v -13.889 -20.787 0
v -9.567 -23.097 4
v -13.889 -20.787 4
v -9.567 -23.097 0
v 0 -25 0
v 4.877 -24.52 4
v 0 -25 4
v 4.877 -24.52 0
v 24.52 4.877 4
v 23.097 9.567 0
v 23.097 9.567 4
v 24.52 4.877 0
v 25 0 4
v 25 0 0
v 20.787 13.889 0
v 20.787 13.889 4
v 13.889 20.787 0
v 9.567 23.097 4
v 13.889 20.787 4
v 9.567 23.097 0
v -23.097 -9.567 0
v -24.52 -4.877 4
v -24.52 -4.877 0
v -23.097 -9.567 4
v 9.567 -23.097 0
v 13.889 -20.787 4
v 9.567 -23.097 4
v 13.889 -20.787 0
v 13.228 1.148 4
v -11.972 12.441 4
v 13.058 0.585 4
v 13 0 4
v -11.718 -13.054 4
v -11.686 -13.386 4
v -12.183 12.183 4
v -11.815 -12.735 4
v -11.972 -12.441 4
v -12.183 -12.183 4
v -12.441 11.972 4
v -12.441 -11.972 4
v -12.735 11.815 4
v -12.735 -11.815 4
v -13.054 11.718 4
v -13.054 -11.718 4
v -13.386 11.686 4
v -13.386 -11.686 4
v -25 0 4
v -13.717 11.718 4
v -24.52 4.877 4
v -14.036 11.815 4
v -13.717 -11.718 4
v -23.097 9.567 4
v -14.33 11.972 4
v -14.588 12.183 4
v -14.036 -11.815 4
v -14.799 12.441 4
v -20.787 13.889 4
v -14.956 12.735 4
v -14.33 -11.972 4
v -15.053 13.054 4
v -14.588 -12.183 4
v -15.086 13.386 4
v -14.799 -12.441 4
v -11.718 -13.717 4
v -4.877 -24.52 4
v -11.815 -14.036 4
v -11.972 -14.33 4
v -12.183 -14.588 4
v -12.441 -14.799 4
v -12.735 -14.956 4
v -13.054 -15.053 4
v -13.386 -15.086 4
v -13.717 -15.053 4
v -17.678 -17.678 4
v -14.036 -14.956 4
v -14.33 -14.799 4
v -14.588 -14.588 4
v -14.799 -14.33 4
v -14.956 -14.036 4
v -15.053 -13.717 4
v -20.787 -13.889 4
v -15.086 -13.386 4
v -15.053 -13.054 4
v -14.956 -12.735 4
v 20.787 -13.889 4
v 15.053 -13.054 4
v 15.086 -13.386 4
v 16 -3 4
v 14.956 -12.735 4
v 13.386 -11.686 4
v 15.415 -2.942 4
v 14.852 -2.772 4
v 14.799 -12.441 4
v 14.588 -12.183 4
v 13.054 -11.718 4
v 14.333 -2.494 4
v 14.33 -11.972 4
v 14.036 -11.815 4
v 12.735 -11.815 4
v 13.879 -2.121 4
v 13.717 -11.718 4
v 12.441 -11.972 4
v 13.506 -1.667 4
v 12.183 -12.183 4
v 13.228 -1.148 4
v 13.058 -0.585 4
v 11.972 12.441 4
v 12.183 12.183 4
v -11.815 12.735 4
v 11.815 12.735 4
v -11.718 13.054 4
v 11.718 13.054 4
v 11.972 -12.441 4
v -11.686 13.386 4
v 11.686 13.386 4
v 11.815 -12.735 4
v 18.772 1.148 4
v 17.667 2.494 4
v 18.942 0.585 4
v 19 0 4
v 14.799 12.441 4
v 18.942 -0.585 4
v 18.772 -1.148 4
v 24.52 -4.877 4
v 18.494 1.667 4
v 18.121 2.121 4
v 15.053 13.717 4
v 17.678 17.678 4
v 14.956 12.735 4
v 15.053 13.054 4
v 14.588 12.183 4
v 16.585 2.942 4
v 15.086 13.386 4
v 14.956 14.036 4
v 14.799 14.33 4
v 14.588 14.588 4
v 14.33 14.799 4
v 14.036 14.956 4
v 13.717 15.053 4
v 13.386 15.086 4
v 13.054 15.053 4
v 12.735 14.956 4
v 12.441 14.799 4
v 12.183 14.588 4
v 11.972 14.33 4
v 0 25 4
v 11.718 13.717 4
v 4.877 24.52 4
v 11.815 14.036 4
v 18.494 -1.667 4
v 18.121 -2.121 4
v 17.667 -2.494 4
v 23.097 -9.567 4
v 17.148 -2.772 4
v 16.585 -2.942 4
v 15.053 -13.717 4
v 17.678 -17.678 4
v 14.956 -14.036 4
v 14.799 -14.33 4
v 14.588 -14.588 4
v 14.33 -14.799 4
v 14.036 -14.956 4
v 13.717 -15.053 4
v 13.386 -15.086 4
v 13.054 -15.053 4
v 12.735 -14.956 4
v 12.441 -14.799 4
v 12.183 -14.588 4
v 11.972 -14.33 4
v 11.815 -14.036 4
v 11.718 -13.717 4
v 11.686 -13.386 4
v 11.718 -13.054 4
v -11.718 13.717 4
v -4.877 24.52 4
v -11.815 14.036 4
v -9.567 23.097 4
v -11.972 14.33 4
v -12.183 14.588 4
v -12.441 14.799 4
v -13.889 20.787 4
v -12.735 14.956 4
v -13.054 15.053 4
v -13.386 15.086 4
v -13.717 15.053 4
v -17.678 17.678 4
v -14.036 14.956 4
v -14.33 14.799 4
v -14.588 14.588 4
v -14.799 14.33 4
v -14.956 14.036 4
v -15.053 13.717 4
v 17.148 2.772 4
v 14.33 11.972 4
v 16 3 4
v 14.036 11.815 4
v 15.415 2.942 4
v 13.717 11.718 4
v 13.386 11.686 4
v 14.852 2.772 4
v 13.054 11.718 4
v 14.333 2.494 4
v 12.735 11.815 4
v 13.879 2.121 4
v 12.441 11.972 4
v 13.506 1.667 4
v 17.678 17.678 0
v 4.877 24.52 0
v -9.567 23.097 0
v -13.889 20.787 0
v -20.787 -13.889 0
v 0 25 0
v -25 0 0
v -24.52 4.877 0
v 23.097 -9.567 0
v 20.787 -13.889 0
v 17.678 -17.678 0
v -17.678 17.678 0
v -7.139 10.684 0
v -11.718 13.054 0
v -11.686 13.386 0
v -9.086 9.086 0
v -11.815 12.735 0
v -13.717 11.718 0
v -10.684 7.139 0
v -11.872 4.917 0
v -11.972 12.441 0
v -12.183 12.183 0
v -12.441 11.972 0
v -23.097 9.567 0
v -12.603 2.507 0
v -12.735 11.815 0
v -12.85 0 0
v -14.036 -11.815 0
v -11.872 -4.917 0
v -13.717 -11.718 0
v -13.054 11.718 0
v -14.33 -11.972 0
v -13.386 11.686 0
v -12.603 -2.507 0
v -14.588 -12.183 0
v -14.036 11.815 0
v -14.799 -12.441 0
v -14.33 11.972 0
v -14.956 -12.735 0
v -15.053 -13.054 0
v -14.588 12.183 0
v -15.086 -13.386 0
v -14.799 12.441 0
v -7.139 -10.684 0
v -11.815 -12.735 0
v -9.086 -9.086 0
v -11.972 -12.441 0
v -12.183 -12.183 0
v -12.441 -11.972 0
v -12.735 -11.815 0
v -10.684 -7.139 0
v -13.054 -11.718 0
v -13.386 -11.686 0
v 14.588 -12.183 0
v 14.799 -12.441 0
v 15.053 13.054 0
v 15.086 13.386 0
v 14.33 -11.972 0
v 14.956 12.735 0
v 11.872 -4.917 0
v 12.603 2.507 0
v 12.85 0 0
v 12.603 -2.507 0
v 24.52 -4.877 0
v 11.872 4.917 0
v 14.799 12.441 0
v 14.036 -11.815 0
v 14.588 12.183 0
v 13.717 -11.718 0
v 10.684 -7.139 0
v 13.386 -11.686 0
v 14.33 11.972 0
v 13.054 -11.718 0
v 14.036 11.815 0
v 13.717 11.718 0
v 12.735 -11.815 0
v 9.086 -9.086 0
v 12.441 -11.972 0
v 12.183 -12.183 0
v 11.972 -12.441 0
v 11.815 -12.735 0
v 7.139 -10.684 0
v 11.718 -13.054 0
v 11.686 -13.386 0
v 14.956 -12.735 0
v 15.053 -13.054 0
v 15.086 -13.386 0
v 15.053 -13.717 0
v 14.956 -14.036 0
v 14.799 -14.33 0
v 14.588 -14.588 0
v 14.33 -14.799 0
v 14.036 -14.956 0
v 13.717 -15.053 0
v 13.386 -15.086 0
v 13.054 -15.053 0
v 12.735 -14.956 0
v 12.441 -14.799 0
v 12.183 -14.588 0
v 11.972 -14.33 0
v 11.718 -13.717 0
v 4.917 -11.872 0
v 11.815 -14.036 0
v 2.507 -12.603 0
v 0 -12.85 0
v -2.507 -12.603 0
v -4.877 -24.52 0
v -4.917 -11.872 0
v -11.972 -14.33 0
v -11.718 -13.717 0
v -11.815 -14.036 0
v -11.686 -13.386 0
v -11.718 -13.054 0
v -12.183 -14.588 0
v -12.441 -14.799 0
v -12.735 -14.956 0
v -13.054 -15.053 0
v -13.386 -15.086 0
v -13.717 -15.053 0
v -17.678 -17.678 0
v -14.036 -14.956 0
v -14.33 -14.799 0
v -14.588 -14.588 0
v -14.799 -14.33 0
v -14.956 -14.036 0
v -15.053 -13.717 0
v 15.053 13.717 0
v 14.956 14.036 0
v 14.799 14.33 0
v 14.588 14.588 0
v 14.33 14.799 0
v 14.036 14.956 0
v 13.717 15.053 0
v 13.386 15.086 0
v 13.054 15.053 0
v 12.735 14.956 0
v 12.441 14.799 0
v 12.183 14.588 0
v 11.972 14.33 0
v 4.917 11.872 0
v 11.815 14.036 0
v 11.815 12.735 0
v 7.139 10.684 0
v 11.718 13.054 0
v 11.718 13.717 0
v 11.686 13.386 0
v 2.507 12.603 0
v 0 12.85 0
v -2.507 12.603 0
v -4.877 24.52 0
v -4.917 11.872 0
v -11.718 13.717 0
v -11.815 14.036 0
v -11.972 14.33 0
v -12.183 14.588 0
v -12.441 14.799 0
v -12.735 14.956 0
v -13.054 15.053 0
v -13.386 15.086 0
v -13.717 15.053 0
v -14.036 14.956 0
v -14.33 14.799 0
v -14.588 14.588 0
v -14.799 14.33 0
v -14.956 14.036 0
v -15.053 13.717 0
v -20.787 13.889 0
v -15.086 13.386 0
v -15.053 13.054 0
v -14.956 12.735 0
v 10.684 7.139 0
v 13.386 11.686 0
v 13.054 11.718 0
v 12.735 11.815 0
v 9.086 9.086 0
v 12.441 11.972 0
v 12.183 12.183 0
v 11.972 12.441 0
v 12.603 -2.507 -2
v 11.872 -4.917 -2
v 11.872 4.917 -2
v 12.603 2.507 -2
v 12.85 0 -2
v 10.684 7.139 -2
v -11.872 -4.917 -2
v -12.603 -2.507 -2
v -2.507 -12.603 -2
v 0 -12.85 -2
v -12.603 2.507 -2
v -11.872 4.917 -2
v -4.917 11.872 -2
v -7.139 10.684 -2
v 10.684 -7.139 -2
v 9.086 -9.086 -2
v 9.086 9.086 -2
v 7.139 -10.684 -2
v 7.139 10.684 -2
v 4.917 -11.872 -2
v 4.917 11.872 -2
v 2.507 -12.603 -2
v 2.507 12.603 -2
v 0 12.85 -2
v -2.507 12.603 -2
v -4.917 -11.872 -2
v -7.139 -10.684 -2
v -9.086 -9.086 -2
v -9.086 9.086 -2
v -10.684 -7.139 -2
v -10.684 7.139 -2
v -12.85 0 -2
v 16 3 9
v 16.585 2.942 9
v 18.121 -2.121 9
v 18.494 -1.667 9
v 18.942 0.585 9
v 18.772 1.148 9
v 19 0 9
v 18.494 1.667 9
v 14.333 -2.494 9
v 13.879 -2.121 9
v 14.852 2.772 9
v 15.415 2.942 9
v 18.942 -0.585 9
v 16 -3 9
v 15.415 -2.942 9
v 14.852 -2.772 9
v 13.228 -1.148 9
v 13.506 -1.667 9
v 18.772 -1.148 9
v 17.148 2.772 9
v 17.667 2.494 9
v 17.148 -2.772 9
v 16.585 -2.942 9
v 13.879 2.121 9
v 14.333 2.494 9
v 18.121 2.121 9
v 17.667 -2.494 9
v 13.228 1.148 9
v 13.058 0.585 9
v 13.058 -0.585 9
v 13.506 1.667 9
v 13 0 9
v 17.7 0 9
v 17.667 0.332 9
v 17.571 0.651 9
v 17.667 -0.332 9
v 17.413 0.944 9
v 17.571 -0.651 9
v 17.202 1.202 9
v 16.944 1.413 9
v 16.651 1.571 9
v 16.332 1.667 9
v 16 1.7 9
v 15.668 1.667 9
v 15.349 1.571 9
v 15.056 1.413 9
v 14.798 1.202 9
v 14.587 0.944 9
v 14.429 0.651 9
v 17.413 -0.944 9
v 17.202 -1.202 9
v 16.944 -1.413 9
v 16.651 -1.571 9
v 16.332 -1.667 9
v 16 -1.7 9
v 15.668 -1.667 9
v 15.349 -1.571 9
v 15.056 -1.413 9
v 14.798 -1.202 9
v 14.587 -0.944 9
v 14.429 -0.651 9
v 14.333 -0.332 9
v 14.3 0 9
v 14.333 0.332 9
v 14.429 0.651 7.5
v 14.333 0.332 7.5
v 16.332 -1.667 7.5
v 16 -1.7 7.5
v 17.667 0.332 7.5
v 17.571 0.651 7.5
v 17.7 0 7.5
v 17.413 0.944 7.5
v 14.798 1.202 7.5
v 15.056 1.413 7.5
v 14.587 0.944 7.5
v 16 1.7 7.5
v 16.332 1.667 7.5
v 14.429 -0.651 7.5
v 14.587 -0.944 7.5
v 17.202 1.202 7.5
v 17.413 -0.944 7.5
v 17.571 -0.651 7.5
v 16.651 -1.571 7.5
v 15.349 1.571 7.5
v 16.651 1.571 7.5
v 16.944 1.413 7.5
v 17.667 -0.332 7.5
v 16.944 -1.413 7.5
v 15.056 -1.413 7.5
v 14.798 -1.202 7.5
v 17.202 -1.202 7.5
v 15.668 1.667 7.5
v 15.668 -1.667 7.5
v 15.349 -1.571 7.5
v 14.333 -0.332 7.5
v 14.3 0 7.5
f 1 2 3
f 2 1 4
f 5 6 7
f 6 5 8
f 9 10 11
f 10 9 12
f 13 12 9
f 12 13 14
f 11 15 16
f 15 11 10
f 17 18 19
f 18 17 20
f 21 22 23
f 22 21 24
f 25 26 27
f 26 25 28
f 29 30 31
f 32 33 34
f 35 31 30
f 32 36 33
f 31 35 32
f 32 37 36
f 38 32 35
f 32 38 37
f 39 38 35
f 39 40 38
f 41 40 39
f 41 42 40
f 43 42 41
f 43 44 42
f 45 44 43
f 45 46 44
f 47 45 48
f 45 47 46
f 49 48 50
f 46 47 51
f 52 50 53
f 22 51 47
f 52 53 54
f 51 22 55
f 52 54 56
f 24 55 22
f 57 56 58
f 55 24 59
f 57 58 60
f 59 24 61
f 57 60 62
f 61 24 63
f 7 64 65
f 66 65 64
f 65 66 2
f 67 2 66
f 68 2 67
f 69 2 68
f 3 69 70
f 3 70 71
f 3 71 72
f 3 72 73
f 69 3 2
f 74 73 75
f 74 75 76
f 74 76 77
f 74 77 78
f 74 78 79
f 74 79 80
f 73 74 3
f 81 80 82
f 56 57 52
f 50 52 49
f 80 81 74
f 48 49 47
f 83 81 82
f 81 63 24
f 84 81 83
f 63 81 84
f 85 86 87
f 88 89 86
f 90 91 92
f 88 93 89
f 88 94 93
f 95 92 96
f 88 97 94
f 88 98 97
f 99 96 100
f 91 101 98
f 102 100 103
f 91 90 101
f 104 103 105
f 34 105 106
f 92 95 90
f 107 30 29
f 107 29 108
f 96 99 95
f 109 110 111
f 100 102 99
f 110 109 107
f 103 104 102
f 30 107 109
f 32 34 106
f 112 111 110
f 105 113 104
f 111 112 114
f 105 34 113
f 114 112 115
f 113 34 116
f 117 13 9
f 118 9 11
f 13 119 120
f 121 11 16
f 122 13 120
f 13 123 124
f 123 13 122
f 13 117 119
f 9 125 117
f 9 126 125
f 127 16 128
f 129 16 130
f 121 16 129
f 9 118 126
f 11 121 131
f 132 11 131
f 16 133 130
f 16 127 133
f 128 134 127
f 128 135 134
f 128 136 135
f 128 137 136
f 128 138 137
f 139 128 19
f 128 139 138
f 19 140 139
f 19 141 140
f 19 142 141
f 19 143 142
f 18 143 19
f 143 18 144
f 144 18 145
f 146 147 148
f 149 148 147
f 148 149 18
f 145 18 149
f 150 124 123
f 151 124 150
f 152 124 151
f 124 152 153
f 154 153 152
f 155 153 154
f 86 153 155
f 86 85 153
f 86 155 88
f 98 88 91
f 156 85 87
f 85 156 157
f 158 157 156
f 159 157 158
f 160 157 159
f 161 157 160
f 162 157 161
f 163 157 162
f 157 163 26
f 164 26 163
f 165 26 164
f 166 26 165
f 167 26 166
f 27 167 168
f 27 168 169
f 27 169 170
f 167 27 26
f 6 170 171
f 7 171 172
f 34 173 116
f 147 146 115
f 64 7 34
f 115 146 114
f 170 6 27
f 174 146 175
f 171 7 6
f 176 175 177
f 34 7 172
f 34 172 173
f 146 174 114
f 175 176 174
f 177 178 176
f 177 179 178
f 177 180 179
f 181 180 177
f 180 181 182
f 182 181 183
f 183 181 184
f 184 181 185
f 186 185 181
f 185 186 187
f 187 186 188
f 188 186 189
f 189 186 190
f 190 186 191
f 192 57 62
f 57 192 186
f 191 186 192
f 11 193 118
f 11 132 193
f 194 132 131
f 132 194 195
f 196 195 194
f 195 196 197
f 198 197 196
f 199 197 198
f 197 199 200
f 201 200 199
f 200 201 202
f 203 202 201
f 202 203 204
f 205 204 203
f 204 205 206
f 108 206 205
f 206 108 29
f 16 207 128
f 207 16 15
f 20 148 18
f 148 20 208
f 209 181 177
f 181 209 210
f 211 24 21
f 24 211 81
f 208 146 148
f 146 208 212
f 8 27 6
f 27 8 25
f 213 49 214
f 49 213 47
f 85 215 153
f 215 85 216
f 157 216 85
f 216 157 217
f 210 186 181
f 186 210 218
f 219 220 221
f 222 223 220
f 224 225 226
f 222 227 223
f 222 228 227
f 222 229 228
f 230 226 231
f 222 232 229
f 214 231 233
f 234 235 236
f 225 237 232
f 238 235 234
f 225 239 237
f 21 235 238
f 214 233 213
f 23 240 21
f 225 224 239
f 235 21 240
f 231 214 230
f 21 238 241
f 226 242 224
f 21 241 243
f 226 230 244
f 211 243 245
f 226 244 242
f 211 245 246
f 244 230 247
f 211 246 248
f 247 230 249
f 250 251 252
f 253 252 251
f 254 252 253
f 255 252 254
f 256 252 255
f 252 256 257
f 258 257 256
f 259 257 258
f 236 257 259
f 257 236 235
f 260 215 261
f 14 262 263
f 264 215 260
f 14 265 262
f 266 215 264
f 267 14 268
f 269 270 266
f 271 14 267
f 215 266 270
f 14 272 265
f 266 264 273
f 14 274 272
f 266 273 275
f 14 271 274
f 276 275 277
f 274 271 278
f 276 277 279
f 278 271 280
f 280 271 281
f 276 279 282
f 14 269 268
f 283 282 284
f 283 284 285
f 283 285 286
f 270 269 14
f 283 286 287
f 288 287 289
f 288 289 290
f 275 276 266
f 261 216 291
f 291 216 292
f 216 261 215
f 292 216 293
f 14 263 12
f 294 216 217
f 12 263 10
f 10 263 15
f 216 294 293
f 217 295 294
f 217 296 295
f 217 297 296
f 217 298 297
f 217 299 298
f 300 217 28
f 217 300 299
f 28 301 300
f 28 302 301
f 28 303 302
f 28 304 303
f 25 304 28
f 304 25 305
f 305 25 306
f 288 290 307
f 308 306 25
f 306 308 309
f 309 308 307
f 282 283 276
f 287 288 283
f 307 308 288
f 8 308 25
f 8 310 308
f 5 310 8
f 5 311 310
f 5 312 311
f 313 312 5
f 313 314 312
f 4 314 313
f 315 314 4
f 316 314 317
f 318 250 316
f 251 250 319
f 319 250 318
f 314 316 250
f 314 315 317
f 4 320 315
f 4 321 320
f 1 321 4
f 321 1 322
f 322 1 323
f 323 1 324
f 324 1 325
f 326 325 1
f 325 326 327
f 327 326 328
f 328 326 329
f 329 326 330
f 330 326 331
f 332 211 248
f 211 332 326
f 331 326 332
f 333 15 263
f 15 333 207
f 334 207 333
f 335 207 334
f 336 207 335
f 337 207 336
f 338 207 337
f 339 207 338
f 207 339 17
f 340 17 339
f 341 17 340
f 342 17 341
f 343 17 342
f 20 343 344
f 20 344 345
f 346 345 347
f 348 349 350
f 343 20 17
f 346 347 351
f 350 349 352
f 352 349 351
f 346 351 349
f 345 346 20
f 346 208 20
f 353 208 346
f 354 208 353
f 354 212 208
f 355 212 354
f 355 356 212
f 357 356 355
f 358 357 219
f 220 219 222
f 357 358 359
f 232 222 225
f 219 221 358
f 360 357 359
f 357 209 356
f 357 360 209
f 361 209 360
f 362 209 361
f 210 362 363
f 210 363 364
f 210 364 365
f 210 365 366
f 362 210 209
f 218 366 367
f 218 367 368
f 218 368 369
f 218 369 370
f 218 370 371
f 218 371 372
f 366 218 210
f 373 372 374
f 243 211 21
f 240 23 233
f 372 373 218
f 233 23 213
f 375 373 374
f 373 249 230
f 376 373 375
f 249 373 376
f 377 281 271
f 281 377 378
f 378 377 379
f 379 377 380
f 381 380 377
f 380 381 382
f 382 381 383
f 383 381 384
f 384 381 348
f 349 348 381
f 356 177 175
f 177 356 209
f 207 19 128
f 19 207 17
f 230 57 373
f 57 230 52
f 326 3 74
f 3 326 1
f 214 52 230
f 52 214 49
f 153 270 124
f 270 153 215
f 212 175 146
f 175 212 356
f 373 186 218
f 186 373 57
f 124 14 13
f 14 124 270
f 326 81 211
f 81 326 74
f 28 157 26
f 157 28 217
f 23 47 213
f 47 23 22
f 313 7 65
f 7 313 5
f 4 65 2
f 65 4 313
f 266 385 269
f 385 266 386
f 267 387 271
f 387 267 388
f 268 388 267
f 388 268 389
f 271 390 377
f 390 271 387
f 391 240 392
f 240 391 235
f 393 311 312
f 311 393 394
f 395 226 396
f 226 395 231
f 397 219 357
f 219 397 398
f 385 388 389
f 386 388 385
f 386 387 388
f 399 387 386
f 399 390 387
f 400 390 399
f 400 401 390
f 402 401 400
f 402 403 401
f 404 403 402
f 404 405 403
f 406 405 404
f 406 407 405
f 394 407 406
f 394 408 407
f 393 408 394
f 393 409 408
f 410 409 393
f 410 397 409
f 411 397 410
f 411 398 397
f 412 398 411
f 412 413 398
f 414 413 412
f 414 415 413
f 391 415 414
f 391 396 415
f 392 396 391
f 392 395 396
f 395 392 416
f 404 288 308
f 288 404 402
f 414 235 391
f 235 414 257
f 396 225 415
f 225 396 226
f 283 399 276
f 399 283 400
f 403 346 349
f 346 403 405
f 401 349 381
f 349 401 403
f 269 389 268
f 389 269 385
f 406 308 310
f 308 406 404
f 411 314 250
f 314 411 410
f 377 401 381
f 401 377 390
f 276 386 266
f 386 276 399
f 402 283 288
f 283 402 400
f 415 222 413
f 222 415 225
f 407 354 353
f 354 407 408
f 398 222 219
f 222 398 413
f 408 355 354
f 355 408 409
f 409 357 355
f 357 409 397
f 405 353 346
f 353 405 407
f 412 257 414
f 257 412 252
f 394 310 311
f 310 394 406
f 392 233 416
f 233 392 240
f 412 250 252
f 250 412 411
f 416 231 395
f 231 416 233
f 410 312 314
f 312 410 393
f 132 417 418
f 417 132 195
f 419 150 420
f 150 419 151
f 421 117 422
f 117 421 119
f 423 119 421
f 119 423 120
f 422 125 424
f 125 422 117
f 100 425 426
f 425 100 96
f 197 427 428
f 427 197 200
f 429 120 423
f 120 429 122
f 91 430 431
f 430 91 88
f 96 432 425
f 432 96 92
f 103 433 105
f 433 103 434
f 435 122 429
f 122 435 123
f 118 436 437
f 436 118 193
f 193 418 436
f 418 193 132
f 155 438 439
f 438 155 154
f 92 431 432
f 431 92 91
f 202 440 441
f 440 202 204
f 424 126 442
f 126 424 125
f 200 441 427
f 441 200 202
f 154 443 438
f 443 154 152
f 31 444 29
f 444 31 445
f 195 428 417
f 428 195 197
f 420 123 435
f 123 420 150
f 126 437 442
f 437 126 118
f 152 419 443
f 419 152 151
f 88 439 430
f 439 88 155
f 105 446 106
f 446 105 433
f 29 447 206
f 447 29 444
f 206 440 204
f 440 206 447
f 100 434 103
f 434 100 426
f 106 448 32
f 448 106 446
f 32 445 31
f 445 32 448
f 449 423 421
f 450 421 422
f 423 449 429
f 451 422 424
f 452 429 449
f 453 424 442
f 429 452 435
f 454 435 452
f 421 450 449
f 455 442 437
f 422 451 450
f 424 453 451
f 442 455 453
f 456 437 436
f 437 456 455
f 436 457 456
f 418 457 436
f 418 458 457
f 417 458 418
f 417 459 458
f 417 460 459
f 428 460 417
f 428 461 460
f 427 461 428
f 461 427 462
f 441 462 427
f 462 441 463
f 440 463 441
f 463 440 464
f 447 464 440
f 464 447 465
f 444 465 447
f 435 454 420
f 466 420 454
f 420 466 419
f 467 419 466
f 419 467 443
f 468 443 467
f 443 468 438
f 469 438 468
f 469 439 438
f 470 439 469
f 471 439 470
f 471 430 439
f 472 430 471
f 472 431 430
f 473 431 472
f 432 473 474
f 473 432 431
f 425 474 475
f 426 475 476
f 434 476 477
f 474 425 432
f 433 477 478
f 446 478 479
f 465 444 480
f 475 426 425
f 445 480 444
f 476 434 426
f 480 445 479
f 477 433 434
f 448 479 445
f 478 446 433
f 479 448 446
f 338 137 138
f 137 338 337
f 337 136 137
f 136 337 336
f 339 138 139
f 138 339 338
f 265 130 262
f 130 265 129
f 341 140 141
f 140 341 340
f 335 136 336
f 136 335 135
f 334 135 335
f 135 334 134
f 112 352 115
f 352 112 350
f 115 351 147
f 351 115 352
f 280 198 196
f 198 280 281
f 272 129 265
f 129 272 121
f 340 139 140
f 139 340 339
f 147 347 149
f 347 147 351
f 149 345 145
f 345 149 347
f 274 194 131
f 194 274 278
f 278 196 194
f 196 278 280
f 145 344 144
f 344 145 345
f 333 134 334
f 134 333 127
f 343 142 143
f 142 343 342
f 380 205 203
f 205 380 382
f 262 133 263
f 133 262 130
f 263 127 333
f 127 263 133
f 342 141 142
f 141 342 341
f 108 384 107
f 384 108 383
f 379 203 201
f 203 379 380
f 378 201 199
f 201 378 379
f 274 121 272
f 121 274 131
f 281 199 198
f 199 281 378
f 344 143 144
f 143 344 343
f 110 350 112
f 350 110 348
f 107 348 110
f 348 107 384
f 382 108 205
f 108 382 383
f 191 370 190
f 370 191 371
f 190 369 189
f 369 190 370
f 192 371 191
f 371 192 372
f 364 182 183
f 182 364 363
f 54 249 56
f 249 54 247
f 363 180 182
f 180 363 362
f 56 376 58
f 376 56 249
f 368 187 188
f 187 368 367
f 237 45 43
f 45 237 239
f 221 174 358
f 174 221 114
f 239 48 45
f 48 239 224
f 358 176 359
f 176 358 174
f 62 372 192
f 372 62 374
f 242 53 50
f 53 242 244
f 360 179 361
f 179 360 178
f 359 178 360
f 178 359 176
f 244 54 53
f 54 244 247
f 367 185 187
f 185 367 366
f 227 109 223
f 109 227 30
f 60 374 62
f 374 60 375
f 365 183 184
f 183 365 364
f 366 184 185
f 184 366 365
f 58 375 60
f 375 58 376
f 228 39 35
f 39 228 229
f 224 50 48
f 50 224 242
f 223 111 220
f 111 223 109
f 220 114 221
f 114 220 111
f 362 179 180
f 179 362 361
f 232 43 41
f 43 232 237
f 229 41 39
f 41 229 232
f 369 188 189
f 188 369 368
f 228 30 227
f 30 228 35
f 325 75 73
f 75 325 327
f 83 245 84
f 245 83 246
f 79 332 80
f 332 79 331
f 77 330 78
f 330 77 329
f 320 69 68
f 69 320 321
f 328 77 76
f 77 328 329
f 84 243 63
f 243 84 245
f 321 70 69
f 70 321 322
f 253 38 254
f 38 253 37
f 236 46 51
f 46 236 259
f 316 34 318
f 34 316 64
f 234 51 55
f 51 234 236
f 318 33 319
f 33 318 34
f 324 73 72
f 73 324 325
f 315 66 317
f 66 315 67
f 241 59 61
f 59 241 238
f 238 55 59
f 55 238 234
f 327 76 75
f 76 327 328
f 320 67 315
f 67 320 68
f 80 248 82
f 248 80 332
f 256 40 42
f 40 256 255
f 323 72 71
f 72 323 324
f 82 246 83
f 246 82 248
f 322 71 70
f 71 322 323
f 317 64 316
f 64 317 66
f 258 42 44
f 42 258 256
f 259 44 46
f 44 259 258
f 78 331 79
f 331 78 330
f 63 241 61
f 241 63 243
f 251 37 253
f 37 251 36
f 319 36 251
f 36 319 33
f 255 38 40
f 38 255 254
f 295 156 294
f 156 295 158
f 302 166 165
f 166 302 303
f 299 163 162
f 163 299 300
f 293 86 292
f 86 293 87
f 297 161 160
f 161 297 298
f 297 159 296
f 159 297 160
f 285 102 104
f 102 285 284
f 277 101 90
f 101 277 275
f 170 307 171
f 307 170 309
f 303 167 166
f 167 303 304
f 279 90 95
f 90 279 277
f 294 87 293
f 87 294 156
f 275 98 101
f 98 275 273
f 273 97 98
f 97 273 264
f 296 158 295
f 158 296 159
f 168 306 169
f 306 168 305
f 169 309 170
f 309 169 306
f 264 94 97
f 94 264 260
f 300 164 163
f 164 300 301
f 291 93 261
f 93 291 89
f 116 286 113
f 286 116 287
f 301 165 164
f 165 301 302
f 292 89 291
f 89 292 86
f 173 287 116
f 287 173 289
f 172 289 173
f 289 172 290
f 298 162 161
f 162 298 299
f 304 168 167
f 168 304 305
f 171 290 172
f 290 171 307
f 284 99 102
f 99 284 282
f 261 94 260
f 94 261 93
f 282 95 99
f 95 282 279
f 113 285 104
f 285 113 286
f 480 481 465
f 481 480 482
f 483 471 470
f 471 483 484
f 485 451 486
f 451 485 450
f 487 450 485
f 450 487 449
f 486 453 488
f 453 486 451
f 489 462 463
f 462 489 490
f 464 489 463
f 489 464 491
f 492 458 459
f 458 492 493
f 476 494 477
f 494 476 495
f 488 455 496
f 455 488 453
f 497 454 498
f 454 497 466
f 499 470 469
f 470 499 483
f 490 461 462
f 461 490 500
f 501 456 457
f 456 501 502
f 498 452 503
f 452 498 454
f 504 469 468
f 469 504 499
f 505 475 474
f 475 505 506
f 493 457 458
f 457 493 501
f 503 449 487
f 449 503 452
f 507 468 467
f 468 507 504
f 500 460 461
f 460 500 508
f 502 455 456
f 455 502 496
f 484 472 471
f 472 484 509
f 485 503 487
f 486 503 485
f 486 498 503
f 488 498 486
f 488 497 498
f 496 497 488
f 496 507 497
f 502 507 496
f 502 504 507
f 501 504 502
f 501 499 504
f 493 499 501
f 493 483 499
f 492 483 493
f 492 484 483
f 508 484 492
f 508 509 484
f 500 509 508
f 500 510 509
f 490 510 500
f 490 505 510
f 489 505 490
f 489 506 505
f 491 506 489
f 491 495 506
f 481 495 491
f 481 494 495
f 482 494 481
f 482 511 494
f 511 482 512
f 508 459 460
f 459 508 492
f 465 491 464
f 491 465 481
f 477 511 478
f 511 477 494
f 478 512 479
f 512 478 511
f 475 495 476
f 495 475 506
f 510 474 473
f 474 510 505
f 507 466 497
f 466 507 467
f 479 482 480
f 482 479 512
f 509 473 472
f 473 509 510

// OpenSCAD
$fn = 32;

// ----------------------------------------------------------------------
// Retaining cap: 6000 cover, 50 mm, spigot 25.7 mm
// ----------------------------------------------------------------------

// --- parameters (mm) ---
cover_d = 50;             // cover diameter
cover_t = 4;              // cover thickness
spigot_d = 25.7;          // spigot that enters the housing
spigot_h = 2;             // spigot height
bolt_d = 3.4;             // bolt clearance
bolt_r = 18.93;           // bolt circle radius
nipple_d = 6;             // grease nipple boss
nipple_h = 5;             // grease nipple boss height

module cover() {
  cylinder(h = cover_t, d = cover_d);
}

module spigot() {
  /* sunk 1 mm into the cover; the spigot sets the overall height */
  translate([0, 0, -spigot_h]) cylinder(h = spigot_h + 1, d = spigot_d);
}

module nipple() {
  translate([cover_d * 0.32, 0, cover_t - 1])
    cylinder(h = nipple_h + 1, d = nipple_d);
}

difference() {
  union() {
    cover();
    spigot();
    nipple();
  }
  for (i = [0 : 3]) rotate([0, 0, 45 + i * 90]) translate([bolt_r, 0, -spigot_h - 1])
    cylinder(h = spigot_h + cover_t + 2, d = bolt_d);
  translate([cover_d * 0.32, 0, cover_t + nipple_h - 1.5]) cylinder(h = 4, d = 3.4);
}
